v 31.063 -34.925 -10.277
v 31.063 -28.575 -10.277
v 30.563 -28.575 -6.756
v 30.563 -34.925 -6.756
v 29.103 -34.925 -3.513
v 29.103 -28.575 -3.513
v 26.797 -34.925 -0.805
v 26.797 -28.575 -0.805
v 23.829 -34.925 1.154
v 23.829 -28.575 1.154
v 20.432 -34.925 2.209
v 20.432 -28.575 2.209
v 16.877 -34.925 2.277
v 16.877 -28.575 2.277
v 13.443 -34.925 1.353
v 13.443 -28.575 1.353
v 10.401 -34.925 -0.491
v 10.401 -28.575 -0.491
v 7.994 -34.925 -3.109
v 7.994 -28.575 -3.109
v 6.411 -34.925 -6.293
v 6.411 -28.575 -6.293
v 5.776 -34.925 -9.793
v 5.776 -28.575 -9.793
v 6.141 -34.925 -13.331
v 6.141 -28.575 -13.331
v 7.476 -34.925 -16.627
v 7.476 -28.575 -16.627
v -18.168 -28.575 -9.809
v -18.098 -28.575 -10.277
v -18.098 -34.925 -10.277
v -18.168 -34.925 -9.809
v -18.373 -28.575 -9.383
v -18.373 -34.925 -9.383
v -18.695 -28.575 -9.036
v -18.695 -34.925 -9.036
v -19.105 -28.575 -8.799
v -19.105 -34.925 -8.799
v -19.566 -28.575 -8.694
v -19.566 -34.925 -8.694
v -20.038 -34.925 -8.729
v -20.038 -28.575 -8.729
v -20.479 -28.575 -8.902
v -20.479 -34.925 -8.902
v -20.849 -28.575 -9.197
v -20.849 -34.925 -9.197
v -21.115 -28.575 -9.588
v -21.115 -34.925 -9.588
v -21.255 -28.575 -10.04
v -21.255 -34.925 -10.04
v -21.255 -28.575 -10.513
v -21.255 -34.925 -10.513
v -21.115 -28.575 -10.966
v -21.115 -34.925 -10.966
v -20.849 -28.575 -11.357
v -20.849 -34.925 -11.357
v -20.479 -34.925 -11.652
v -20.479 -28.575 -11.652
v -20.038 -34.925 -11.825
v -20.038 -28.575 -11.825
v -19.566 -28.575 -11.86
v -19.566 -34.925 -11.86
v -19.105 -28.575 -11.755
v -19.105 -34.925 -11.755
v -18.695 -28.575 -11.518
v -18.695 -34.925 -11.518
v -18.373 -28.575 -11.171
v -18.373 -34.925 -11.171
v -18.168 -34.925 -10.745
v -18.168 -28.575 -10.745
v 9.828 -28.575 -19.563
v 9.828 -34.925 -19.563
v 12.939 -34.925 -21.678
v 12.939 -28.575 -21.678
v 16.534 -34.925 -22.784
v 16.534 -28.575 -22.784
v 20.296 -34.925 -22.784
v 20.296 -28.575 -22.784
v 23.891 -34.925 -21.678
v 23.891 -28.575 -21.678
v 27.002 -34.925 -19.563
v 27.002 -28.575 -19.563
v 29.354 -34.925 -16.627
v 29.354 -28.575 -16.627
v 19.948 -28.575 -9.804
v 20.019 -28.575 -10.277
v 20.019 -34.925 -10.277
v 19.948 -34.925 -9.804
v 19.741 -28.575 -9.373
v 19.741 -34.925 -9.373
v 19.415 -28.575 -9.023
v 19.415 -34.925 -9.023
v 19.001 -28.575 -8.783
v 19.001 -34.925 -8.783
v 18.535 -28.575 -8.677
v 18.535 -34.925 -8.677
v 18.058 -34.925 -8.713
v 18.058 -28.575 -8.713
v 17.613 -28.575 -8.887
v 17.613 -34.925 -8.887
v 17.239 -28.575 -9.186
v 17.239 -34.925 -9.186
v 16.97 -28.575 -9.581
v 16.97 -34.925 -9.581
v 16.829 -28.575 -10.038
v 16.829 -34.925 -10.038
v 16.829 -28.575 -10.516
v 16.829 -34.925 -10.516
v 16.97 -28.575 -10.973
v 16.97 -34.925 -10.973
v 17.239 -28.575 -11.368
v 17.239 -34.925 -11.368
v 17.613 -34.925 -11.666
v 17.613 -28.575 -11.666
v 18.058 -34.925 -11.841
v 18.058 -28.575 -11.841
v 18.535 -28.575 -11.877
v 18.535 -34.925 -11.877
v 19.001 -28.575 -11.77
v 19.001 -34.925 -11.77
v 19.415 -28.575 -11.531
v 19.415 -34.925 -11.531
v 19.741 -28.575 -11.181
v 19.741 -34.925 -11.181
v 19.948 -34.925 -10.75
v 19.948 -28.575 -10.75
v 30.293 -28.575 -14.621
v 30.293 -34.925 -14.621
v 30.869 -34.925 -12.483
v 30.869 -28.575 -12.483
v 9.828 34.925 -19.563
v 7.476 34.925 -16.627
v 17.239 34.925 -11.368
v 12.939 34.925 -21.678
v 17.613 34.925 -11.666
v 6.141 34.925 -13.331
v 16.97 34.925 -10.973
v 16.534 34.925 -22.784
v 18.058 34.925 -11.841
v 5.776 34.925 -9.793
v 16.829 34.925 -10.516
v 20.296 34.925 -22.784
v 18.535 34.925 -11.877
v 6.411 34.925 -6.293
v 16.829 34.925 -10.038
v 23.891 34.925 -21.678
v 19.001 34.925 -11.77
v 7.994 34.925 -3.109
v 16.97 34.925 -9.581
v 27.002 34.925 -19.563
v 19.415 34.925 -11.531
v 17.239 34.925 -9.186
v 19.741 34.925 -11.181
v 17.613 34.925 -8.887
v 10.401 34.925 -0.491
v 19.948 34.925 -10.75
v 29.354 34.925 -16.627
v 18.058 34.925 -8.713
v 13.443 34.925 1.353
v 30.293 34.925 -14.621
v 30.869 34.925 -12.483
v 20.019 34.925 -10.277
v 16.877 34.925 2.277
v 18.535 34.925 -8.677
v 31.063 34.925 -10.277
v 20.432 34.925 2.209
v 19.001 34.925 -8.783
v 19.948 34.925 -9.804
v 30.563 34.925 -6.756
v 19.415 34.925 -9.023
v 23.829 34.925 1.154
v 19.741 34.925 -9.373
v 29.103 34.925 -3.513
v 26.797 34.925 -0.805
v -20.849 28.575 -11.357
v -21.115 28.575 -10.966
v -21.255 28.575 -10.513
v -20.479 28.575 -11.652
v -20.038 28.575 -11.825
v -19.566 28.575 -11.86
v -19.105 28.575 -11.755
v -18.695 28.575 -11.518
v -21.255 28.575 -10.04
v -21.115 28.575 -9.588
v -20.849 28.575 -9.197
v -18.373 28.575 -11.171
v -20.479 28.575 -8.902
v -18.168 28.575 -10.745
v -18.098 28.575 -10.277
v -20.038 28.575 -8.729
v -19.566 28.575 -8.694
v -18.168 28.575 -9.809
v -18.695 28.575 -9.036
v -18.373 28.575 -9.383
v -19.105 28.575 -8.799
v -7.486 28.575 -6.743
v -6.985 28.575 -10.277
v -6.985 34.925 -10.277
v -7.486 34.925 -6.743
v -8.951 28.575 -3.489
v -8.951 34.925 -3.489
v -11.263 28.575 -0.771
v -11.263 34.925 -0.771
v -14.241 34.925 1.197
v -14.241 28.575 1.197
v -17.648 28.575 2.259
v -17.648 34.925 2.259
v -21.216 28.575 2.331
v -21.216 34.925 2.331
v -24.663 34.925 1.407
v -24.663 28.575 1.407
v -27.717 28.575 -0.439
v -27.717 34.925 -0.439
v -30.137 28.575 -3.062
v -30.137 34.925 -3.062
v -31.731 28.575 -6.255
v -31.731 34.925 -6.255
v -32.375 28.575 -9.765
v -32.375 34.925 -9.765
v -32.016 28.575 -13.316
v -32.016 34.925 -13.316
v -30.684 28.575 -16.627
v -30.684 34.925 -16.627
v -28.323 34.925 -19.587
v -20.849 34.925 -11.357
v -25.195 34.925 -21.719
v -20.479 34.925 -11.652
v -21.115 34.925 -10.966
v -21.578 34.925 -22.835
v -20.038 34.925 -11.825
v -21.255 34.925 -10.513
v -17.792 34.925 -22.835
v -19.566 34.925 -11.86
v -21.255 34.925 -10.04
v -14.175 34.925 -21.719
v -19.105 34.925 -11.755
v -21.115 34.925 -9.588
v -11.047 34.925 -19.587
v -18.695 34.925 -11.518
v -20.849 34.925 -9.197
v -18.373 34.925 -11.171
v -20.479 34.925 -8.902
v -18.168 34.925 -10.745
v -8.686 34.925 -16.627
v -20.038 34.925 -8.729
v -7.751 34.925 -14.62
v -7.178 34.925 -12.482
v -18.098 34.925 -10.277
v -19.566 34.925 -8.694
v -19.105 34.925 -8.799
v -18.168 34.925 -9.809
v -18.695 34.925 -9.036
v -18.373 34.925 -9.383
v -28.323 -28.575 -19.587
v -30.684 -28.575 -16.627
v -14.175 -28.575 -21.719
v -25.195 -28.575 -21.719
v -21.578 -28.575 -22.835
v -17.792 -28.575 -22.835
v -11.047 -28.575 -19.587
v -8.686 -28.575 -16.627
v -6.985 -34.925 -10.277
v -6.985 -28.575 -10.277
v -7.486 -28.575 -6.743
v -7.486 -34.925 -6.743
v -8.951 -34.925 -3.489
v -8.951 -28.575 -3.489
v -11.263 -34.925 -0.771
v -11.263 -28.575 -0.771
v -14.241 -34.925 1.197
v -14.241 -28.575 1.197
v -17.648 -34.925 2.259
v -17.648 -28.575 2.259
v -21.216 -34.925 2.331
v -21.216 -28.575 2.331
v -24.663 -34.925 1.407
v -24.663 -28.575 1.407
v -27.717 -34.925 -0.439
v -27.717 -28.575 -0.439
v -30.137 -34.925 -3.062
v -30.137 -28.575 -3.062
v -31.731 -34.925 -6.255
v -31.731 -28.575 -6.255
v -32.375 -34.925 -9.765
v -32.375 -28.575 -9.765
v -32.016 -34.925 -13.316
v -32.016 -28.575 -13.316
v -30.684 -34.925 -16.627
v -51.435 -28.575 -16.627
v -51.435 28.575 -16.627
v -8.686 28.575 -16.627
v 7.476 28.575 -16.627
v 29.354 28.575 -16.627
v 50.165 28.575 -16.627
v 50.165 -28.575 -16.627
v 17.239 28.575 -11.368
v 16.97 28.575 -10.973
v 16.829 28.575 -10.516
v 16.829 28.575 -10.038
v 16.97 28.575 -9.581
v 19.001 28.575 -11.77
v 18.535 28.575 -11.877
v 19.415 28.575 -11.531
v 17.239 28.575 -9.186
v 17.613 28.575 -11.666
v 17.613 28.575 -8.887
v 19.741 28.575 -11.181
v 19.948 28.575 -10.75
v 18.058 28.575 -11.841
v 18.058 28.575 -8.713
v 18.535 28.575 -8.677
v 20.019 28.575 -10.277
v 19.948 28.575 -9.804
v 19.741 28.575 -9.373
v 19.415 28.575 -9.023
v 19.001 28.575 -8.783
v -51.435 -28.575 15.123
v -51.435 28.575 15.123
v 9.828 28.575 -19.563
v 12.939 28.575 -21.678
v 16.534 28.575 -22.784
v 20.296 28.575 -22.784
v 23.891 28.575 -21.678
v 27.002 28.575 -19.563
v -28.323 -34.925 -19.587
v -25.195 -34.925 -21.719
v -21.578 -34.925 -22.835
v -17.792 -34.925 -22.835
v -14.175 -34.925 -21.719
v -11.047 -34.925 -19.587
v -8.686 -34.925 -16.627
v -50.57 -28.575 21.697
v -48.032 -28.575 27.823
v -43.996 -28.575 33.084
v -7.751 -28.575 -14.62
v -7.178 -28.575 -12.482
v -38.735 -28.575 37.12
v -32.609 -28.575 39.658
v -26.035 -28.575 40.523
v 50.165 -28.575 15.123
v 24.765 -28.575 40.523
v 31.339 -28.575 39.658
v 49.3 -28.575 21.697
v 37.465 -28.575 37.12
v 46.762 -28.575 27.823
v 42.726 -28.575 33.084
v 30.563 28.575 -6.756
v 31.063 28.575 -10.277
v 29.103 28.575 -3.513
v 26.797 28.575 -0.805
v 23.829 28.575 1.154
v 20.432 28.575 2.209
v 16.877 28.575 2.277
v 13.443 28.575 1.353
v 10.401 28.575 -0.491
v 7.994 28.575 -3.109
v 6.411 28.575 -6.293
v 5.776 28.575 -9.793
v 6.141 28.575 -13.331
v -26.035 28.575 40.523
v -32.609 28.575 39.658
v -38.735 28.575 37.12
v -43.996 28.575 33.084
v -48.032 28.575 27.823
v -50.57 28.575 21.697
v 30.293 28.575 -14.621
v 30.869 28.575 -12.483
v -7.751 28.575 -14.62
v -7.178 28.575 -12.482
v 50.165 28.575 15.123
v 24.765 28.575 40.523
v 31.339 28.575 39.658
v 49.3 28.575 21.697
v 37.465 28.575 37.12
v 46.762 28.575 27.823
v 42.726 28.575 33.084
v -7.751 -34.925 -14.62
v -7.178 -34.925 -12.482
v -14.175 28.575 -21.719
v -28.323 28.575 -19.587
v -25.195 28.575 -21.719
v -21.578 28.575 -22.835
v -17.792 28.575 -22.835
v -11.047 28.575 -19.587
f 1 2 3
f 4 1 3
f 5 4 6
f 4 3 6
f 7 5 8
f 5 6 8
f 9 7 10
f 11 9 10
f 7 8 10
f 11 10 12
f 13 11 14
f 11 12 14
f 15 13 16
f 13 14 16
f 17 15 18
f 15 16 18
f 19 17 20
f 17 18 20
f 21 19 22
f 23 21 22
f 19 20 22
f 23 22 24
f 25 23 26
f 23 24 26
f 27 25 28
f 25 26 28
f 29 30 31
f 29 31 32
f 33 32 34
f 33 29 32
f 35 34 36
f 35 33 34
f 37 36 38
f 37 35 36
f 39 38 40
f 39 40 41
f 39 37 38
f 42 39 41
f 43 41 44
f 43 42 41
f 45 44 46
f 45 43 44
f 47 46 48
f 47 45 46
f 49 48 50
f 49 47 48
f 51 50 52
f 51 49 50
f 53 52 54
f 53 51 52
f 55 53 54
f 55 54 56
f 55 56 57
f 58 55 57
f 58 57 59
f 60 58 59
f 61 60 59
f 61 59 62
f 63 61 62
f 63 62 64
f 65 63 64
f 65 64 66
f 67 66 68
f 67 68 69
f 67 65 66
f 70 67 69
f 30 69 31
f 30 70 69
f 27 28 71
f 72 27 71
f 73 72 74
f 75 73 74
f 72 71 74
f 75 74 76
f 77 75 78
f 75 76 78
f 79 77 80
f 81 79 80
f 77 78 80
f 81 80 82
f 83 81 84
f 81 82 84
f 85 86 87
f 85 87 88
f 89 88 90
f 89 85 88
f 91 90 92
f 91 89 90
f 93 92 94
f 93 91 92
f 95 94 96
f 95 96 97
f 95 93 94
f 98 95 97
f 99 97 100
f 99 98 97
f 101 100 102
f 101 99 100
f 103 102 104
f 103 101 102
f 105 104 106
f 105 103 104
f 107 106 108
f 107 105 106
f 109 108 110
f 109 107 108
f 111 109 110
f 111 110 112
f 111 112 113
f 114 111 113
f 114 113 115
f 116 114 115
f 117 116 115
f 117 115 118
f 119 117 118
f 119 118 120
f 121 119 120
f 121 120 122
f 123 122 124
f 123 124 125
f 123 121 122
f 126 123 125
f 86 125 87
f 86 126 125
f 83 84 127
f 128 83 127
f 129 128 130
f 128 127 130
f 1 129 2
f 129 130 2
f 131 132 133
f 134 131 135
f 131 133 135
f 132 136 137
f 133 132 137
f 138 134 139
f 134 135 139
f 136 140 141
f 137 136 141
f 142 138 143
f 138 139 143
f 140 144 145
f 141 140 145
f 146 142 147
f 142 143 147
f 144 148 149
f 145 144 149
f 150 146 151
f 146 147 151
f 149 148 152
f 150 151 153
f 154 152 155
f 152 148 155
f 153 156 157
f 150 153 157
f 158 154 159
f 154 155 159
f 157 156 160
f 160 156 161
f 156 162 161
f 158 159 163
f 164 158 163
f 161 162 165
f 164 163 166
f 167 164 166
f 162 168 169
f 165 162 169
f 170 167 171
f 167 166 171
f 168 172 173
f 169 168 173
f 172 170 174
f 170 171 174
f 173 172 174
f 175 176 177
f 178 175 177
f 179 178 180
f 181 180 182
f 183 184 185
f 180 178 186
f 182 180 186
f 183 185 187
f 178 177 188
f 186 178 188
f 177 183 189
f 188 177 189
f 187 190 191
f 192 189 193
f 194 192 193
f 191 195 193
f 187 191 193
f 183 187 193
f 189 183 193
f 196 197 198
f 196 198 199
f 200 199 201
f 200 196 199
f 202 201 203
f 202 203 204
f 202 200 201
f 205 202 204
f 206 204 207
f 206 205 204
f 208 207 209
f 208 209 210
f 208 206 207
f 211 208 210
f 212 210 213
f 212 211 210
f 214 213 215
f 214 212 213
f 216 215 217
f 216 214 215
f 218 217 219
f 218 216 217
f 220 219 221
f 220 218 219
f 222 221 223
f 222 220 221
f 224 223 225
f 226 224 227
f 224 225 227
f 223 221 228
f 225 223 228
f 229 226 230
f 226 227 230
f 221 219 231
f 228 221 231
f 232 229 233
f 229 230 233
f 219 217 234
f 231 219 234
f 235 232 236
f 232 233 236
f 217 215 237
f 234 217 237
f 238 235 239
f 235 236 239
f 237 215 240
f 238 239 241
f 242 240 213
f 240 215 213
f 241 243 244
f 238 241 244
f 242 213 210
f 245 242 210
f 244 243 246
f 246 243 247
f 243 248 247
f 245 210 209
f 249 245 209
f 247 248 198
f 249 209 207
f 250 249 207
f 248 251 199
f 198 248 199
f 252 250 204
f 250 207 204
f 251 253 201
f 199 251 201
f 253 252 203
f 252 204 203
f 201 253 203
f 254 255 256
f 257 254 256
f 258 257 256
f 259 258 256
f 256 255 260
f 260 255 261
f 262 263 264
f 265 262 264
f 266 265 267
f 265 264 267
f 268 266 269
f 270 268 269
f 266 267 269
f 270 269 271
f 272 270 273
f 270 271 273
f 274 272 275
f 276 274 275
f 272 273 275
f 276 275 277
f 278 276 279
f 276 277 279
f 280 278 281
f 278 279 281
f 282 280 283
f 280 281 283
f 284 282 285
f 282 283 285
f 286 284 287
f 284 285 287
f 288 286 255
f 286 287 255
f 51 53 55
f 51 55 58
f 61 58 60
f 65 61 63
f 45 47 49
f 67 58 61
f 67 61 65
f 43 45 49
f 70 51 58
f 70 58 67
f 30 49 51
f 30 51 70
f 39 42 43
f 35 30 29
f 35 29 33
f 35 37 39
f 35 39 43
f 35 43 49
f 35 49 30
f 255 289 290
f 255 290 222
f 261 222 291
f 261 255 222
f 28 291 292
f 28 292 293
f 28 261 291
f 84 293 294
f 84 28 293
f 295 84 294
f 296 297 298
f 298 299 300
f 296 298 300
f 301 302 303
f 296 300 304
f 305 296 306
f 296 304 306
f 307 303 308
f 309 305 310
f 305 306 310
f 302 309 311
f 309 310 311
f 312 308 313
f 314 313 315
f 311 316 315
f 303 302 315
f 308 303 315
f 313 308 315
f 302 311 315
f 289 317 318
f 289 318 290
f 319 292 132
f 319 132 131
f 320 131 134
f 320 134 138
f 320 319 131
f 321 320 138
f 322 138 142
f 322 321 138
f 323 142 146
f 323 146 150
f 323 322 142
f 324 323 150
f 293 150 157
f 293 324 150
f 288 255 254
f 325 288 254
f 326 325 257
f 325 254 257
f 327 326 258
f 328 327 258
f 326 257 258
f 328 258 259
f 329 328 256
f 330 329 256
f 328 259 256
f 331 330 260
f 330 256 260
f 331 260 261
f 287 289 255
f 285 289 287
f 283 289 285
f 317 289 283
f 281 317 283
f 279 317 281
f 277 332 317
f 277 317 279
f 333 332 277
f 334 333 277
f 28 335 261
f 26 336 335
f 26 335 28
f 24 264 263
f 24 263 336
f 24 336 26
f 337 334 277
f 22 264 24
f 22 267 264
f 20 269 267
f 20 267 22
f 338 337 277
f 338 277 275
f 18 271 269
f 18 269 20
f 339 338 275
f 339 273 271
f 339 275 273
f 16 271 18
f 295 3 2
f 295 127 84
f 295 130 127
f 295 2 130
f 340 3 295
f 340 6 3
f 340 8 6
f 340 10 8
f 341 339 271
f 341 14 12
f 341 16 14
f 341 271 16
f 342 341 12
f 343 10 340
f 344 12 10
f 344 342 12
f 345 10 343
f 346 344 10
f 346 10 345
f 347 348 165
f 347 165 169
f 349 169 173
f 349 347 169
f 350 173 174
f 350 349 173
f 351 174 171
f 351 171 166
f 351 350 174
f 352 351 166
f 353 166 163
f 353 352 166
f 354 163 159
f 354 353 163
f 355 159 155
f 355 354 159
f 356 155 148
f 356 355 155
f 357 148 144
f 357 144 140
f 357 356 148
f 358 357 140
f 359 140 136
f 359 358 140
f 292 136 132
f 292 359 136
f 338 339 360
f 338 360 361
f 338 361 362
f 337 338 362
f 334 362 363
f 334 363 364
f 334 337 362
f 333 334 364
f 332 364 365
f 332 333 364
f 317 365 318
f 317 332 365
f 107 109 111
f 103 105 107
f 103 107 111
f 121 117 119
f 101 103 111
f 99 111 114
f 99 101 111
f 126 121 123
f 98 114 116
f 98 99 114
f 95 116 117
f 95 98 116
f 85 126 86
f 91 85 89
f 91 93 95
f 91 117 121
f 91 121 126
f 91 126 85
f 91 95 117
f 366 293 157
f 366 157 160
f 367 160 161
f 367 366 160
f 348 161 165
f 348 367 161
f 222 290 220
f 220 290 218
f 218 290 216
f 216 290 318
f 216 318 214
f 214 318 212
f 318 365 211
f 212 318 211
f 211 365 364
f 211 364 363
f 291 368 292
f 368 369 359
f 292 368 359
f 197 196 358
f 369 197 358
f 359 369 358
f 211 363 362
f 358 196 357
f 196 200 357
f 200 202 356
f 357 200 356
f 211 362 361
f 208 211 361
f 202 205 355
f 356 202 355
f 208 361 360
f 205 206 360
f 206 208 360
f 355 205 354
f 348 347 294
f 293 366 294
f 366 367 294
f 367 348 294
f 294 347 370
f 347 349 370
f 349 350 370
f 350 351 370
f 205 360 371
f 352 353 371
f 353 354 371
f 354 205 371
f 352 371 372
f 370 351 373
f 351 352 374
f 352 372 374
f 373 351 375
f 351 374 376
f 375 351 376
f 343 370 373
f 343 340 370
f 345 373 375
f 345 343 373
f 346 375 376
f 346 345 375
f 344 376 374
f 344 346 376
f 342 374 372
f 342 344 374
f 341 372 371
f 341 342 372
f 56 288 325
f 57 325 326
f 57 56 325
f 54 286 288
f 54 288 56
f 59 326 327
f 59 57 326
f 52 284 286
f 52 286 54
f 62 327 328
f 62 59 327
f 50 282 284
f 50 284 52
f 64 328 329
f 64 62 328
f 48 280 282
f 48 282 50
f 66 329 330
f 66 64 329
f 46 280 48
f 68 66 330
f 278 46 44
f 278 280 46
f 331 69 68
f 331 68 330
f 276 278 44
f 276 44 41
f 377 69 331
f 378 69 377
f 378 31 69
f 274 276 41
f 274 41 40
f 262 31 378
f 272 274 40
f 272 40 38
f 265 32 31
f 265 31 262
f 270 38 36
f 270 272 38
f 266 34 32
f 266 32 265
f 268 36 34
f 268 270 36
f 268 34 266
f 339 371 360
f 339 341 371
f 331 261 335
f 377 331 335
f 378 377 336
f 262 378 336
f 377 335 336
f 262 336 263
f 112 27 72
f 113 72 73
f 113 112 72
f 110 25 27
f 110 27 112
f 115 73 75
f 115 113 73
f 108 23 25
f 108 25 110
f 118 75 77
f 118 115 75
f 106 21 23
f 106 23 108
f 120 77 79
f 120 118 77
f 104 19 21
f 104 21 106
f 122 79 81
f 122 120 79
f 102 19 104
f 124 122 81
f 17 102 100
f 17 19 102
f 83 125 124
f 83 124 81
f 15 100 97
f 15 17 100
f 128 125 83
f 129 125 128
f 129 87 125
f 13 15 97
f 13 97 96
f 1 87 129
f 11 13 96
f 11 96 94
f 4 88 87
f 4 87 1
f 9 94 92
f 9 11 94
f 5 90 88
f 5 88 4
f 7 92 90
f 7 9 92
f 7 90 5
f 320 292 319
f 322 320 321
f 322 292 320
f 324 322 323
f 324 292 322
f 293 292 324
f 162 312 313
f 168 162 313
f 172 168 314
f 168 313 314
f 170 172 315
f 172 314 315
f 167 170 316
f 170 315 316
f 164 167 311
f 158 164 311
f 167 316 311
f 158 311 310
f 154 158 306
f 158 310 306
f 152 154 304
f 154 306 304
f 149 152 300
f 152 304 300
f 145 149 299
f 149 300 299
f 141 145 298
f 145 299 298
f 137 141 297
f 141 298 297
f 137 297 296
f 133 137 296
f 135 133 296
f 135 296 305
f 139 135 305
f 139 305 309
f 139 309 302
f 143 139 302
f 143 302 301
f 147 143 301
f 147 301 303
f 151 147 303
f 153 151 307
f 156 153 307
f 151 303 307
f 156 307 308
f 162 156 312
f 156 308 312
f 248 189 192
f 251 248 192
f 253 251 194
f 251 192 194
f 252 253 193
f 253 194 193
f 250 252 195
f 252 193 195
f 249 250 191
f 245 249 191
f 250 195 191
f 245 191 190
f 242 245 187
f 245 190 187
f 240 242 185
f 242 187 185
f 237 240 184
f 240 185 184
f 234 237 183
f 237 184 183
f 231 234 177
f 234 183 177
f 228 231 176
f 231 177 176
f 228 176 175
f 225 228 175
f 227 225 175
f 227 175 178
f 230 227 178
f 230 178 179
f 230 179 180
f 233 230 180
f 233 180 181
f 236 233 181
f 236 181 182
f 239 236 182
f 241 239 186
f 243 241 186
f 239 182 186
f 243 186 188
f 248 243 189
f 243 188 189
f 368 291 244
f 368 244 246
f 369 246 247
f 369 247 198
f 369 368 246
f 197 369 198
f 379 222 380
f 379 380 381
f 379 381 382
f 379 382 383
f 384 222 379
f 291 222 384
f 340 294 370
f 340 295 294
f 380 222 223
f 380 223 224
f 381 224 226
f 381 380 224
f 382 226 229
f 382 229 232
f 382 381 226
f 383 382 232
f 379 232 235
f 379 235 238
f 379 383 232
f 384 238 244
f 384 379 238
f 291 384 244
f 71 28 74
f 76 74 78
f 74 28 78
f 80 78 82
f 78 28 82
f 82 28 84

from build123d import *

# Parameters (mm, degrees)
F1_DEPTH = 28.575
F2_R     = 1.5875
F2_R_2   = 1.6042654536
F3_DEPTH = 6.35


with BuildPart() as f1:
    # F0 (on Front) → F1 (new body, symmetric)
    with BuildSketch(Plane.XZ):
        with BuildLine():
            Line((24.765, 40.5231858473), (-26.035, 40.5231858473))
            ThreePointArc((-26.035, 40.5231858473), (-43.9955122421, 33.0836980894), (-51.435, 15.1231858473))
            Line((-51.435, 15.1231858473), (-51.435, -16.6268141527))
            Line((-51.435, -16.6268141527), (50.165, -16.6268141527))
            Line((50.165, -16.6268141527), (50.165, 15.1231858473))
            ThreePointArc((50.165, 15.1231858473), (42.7255122421, 33.0836980894), (24.765, 40.5231858473))
        make_face()
    extrude(amount=F1_DEPTH, both=True)

    # F2 (on face) → F3 (join)
    with BuildSketch(Plane.XZ.offset(28.575)):
        with BuildLine():
            ThreePointArc((-8.6864773719, -16.6268141527), (-7.4177420061, -13.5638160255), (-6.985, -10.2768141527))
            ThreePointArc((-6.985, -10.2768141527), (-22.9720018728, 1.9904438412), (-30.6835226281, -16.6268141527))
            Line((-30.6835226281, -16.6268141527), (-8.6864773719, -16.6268141527))
        make_face()
        with Locations((-19.685, -10.2768141527)):
            Circle(F2_R, mode=Mode.SUBTRACT)
        with BuildLine():
            Line((-8.6864773719, -16.6268141527), (-30.6835226281, -16.6268141527))
            ThreePointArc((-30.6835226281, -16.6268141527), (-19.685, -22.9768141527), (-8.6864773719, -16.6268141527))
        make_face()
        with BuildLine():
            Line((29.3535084774, -16.6268141527), (7.4764915226, -16.6268141527))
            ThreePointArc((7.4764915226, -16.6268141527), (18.415, -22.9248759691), (29.3535084774, -16.6268141527))
        make_face()
        with BuildLine():
            ThreePointArc((31.0630618164, -10.2768141527), (15.1269507068, 1.9363836086), (7.4764915226, -16.6268141527))
            Line((7.4764915226, -16.6268141527), (29.3535084774, -16.6268141527))
            ThreePointArc((29.3535084774, -16.6268141527), (30.6281977613, -13.5648634459), (31.0630618164, -10.2768141527))
        make_face()
        with Locations((18.415, -10.2768141527)):
            Circle(F2_R_2, mode=Mode.SUBTRACT)
    extrude(amount=F3_DEPTH)

    # F4: F1 across plane


with BuildPart() as f1_1:
    add(f1.part)
    add(f1.part.mirror(Plane.XZ))


solid = f1_1.part
